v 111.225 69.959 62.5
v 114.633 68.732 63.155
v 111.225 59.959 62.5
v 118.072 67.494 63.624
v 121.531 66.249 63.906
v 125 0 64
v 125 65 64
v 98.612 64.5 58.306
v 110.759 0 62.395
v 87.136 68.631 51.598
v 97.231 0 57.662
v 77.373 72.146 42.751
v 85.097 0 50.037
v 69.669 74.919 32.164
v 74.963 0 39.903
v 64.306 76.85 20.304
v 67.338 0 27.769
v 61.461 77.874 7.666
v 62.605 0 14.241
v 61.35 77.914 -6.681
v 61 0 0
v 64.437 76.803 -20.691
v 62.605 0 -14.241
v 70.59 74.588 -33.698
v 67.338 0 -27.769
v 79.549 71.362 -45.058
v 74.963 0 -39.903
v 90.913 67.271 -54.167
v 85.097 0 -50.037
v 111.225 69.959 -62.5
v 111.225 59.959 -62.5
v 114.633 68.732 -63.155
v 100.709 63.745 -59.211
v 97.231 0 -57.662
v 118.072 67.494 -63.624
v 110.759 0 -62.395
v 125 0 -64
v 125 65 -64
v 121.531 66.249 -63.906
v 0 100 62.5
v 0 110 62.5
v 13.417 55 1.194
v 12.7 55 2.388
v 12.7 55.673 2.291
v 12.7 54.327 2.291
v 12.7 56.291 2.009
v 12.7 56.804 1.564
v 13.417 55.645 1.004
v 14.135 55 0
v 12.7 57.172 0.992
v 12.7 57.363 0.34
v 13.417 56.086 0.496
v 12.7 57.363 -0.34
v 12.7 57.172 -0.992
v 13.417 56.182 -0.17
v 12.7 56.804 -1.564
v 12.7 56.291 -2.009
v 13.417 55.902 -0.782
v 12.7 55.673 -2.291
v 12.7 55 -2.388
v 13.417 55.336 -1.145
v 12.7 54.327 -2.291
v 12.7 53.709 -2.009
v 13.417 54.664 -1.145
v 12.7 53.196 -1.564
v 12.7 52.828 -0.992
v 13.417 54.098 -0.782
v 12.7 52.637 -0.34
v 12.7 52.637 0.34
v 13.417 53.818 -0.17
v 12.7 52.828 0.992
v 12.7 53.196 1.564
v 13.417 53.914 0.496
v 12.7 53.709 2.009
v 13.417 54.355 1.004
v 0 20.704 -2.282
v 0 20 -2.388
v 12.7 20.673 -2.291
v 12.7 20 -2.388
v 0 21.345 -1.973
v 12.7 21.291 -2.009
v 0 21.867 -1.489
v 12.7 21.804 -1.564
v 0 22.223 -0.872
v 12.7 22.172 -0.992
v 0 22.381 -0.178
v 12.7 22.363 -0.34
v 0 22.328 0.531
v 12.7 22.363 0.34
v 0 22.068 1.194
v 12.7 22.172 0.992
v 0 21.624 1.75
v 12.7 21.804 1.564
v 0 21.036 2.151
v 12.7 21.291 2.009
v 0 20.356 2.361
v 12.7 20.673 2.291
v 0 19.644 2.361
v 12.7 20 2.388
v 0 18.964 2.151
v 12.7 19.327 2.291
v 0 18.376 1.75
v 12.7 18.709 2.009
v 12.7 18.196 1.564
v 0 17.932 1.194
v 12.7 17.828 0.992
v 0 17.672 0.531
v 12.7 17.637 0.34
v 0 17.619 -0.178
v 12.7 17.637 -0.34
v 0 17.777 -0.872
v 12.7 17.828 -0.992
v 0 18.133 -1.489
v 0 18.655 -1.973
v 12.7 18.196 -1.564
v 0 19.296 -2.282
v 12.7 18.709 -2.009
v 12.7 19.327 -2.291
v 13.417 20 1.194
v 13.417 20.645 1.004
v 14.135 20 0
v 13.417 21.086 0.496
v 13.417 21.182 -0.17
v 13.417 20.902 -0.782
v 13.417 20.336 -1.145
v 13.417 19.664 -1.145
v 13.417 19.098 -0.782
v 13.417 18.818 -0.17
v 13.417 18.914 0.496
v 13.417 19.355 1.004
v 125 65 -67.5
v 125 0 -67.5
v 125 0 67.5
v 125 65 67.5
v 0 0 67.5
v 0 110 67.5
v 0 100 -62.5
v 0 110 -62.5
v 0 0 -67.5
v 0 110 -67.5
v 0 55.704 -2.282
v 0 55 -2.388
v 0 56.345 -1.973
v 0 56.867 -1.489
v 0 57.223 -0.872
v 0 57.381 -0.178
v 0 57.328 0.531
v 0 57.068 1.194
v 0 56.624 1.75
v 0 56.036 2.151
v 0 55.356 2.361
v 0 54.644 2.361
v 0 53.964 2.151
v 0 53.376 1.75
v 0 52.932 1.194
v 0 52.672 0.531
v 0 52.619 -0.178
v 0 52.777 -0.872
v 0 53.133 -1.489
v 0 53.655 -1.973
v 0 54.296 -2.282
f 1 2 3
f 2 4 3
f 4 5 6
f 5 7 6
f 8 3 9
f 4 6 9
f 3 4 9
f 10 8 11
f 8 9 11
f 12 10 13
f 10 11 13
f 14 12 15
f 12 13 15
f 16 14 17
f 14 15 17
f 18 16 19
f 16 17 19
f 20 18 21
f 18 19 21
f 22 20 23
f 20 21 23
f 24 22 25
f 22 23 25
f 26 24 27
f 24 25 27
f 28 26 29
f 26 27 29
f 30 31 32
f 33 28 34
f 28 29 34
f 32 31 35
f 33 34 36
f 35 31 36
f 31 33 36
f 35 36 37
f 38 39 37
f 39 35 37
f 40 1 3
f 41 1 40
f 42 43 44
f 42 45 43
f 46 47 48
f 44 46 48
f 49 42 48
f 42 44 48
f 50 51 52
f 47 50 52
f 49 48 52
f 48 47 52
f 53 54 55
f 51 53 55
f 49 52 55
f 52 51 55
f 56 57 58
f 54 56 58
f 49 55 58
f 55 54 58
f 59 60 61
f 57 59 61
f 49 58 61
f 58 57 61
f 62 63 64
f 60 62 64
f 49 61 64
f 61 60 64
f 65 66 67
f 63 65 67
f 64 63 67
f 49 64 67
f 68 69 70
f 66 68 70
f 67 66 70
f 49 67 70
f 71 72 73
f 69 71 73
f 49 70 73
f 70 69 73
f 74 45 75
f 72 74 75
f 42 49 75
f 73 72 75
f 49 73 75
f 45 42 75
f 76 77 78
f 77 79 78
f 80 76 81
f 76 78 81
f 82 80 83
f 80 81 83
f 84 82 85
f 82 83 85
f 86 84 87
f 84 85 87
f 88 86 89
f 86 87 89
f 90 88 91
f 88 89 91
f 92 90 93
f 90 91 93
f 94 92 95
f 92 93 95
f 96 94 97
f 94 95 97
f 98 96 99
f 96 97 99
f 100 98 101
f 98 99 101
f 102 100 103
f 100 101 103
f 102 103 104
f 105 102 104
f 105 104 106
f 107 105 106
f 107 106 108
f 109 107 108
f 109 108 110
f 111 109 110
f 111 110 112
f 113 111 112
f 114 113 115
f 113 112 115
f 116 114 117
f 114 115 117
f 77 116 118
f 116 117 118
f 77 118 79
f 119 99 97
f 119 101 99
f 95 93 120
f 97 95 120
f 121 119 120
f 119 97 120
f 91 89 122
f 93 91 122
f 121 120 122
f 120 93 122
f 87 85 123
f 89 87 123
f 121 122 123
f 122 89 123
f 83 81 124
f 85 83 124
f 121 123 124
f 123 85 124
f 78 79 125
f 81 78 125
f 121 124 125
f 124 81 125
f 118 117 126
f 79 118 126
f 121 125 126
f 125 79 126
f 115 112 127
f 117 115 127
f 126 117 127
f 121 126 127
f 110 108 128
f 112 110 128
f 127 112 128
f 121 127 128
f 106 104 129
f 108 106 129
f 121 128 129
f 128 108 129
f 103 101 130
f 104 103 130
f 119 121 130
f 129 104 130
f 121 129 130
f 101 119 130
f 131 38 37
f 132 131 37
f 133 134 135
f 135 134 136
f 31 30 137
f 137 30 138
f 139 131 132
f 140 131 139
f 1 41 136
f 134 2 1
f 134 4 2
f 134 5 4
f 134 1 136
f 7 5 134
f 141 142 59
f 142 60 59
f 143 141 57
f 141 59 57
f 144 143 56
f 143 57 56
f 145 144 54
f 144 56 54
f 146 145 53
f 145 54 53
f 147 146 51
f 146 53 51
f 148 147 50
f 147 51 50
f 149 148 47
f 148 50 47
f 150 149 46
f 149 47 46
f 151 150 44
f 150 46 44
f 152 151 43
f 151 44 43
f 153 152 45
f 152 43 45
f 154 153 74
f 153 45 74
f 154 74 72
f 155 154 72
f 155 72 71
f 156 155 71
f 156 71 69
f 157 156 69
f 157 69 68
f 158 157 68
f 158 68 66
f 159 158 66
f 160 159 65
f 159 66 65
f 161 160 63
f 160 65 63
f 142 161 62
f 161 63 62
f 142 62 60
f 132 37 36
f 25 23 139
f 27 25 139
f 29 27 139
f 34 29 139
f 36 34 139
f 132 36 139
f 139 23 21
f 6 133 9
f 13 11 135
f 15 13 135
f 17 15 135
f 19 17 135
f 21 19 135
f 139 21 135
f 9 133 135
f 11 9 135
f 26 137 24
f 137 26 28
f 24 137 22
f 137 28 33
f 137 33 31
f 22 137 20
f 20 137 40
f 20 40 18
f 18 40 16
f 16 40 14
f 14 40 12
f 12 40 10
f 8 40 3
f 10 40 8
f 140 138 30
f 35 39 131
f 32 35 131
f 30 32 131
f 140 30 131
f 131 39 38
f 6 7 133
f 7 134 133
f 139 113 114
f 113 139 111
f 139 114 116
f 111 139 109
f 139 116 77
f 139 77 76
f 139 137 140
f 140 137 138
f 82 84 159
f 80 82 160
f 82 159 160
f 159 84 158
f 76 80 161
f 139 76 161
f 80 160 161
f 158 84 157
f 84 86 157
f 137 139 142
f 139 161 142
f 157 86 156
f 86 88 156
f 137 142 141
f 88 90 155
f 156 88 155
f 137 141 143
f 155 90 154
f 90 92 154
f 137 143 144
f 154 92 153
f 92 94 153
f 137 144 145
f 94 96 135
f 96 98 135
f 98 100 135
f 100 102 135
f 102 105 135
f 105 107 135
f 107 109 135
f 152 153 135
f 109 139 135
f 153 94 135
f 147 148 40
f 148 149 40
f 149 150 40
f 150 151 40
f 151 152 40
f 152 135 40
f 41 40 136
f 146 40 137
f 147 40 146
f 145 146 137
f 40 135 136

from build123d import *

# Parameters (mm, degrees)
BOSS_EXTRUDE1_DEPTH        = 62.5
BOSS_EXTRUDE2_DEPTH        = 5
SKETCH3_R                  = 64
CUT_EXTRUDE1_DEPTH         = 111
F_10_CLEARANCE_HOLE1_D     = 4.7752
F_10_CLEARANCE_HOLE1_DEPTH = 12.7
F_10_CLEARANCE_HOLE1_TIP   = 1.434614814


with BuildPart() as part:
    # Sketch2 → Boss-Extrude1 (new body, symmetric)
    with BuildSketch(Plane.XY):
        Polygon((0, 0), (0, 100), (125, 55), (125, 0), align=None)
    extrude(amount=BOSS_EXTRUDE1_DEPTH, both=True)

    # Sketch4 → Boss-Extrude2 (add)
    with BuildSketch(Plane.XY.offset(62.5)):
        Polygon((0, 0), (0, 110), (125, 65), (125, 0), align=None)
    boss_extrude2 = extrude(amount=BOSS_EXTRUDE2_DEPTH)

    # Mirror1: Boss-Extrude2 across plane
    add(boss_extrude2.mirror(Plane.XY))

    # Sketch3 → Cut-Extrude1 (cut, through all)
    with BuildSketch(Plane.XZ):
        with Locations((125, 0)):
            Circle(SKETCH3_R)
    extrude(amount=-CUT_EXTRUDE1_DEPTH, mode=Mode.SUBTRACT)

    # #10 Clearance Hole1
    with Locations(Plane.ZY):
        with Locations((0, 55), (0, 20)):
            Hole(F_10_CLEARANCE_HOLE1_D / 2, depth=F_10_CLEARANCE_HOLE1_DEPTH)
            with Locations((0, 0, -(F_10_CLEARANCE_HOLE1_DEPTH + F_10_CLEARANCE_HOLE1_TIP / 2))):  # 118° drill point
                Cone(0, F_10_CLEARANCE_HOLE1_D / 2, F_10_CLEARANCE_HOLE1_TIP, mode=Mode.SUBTRACT)


solid = part.part
